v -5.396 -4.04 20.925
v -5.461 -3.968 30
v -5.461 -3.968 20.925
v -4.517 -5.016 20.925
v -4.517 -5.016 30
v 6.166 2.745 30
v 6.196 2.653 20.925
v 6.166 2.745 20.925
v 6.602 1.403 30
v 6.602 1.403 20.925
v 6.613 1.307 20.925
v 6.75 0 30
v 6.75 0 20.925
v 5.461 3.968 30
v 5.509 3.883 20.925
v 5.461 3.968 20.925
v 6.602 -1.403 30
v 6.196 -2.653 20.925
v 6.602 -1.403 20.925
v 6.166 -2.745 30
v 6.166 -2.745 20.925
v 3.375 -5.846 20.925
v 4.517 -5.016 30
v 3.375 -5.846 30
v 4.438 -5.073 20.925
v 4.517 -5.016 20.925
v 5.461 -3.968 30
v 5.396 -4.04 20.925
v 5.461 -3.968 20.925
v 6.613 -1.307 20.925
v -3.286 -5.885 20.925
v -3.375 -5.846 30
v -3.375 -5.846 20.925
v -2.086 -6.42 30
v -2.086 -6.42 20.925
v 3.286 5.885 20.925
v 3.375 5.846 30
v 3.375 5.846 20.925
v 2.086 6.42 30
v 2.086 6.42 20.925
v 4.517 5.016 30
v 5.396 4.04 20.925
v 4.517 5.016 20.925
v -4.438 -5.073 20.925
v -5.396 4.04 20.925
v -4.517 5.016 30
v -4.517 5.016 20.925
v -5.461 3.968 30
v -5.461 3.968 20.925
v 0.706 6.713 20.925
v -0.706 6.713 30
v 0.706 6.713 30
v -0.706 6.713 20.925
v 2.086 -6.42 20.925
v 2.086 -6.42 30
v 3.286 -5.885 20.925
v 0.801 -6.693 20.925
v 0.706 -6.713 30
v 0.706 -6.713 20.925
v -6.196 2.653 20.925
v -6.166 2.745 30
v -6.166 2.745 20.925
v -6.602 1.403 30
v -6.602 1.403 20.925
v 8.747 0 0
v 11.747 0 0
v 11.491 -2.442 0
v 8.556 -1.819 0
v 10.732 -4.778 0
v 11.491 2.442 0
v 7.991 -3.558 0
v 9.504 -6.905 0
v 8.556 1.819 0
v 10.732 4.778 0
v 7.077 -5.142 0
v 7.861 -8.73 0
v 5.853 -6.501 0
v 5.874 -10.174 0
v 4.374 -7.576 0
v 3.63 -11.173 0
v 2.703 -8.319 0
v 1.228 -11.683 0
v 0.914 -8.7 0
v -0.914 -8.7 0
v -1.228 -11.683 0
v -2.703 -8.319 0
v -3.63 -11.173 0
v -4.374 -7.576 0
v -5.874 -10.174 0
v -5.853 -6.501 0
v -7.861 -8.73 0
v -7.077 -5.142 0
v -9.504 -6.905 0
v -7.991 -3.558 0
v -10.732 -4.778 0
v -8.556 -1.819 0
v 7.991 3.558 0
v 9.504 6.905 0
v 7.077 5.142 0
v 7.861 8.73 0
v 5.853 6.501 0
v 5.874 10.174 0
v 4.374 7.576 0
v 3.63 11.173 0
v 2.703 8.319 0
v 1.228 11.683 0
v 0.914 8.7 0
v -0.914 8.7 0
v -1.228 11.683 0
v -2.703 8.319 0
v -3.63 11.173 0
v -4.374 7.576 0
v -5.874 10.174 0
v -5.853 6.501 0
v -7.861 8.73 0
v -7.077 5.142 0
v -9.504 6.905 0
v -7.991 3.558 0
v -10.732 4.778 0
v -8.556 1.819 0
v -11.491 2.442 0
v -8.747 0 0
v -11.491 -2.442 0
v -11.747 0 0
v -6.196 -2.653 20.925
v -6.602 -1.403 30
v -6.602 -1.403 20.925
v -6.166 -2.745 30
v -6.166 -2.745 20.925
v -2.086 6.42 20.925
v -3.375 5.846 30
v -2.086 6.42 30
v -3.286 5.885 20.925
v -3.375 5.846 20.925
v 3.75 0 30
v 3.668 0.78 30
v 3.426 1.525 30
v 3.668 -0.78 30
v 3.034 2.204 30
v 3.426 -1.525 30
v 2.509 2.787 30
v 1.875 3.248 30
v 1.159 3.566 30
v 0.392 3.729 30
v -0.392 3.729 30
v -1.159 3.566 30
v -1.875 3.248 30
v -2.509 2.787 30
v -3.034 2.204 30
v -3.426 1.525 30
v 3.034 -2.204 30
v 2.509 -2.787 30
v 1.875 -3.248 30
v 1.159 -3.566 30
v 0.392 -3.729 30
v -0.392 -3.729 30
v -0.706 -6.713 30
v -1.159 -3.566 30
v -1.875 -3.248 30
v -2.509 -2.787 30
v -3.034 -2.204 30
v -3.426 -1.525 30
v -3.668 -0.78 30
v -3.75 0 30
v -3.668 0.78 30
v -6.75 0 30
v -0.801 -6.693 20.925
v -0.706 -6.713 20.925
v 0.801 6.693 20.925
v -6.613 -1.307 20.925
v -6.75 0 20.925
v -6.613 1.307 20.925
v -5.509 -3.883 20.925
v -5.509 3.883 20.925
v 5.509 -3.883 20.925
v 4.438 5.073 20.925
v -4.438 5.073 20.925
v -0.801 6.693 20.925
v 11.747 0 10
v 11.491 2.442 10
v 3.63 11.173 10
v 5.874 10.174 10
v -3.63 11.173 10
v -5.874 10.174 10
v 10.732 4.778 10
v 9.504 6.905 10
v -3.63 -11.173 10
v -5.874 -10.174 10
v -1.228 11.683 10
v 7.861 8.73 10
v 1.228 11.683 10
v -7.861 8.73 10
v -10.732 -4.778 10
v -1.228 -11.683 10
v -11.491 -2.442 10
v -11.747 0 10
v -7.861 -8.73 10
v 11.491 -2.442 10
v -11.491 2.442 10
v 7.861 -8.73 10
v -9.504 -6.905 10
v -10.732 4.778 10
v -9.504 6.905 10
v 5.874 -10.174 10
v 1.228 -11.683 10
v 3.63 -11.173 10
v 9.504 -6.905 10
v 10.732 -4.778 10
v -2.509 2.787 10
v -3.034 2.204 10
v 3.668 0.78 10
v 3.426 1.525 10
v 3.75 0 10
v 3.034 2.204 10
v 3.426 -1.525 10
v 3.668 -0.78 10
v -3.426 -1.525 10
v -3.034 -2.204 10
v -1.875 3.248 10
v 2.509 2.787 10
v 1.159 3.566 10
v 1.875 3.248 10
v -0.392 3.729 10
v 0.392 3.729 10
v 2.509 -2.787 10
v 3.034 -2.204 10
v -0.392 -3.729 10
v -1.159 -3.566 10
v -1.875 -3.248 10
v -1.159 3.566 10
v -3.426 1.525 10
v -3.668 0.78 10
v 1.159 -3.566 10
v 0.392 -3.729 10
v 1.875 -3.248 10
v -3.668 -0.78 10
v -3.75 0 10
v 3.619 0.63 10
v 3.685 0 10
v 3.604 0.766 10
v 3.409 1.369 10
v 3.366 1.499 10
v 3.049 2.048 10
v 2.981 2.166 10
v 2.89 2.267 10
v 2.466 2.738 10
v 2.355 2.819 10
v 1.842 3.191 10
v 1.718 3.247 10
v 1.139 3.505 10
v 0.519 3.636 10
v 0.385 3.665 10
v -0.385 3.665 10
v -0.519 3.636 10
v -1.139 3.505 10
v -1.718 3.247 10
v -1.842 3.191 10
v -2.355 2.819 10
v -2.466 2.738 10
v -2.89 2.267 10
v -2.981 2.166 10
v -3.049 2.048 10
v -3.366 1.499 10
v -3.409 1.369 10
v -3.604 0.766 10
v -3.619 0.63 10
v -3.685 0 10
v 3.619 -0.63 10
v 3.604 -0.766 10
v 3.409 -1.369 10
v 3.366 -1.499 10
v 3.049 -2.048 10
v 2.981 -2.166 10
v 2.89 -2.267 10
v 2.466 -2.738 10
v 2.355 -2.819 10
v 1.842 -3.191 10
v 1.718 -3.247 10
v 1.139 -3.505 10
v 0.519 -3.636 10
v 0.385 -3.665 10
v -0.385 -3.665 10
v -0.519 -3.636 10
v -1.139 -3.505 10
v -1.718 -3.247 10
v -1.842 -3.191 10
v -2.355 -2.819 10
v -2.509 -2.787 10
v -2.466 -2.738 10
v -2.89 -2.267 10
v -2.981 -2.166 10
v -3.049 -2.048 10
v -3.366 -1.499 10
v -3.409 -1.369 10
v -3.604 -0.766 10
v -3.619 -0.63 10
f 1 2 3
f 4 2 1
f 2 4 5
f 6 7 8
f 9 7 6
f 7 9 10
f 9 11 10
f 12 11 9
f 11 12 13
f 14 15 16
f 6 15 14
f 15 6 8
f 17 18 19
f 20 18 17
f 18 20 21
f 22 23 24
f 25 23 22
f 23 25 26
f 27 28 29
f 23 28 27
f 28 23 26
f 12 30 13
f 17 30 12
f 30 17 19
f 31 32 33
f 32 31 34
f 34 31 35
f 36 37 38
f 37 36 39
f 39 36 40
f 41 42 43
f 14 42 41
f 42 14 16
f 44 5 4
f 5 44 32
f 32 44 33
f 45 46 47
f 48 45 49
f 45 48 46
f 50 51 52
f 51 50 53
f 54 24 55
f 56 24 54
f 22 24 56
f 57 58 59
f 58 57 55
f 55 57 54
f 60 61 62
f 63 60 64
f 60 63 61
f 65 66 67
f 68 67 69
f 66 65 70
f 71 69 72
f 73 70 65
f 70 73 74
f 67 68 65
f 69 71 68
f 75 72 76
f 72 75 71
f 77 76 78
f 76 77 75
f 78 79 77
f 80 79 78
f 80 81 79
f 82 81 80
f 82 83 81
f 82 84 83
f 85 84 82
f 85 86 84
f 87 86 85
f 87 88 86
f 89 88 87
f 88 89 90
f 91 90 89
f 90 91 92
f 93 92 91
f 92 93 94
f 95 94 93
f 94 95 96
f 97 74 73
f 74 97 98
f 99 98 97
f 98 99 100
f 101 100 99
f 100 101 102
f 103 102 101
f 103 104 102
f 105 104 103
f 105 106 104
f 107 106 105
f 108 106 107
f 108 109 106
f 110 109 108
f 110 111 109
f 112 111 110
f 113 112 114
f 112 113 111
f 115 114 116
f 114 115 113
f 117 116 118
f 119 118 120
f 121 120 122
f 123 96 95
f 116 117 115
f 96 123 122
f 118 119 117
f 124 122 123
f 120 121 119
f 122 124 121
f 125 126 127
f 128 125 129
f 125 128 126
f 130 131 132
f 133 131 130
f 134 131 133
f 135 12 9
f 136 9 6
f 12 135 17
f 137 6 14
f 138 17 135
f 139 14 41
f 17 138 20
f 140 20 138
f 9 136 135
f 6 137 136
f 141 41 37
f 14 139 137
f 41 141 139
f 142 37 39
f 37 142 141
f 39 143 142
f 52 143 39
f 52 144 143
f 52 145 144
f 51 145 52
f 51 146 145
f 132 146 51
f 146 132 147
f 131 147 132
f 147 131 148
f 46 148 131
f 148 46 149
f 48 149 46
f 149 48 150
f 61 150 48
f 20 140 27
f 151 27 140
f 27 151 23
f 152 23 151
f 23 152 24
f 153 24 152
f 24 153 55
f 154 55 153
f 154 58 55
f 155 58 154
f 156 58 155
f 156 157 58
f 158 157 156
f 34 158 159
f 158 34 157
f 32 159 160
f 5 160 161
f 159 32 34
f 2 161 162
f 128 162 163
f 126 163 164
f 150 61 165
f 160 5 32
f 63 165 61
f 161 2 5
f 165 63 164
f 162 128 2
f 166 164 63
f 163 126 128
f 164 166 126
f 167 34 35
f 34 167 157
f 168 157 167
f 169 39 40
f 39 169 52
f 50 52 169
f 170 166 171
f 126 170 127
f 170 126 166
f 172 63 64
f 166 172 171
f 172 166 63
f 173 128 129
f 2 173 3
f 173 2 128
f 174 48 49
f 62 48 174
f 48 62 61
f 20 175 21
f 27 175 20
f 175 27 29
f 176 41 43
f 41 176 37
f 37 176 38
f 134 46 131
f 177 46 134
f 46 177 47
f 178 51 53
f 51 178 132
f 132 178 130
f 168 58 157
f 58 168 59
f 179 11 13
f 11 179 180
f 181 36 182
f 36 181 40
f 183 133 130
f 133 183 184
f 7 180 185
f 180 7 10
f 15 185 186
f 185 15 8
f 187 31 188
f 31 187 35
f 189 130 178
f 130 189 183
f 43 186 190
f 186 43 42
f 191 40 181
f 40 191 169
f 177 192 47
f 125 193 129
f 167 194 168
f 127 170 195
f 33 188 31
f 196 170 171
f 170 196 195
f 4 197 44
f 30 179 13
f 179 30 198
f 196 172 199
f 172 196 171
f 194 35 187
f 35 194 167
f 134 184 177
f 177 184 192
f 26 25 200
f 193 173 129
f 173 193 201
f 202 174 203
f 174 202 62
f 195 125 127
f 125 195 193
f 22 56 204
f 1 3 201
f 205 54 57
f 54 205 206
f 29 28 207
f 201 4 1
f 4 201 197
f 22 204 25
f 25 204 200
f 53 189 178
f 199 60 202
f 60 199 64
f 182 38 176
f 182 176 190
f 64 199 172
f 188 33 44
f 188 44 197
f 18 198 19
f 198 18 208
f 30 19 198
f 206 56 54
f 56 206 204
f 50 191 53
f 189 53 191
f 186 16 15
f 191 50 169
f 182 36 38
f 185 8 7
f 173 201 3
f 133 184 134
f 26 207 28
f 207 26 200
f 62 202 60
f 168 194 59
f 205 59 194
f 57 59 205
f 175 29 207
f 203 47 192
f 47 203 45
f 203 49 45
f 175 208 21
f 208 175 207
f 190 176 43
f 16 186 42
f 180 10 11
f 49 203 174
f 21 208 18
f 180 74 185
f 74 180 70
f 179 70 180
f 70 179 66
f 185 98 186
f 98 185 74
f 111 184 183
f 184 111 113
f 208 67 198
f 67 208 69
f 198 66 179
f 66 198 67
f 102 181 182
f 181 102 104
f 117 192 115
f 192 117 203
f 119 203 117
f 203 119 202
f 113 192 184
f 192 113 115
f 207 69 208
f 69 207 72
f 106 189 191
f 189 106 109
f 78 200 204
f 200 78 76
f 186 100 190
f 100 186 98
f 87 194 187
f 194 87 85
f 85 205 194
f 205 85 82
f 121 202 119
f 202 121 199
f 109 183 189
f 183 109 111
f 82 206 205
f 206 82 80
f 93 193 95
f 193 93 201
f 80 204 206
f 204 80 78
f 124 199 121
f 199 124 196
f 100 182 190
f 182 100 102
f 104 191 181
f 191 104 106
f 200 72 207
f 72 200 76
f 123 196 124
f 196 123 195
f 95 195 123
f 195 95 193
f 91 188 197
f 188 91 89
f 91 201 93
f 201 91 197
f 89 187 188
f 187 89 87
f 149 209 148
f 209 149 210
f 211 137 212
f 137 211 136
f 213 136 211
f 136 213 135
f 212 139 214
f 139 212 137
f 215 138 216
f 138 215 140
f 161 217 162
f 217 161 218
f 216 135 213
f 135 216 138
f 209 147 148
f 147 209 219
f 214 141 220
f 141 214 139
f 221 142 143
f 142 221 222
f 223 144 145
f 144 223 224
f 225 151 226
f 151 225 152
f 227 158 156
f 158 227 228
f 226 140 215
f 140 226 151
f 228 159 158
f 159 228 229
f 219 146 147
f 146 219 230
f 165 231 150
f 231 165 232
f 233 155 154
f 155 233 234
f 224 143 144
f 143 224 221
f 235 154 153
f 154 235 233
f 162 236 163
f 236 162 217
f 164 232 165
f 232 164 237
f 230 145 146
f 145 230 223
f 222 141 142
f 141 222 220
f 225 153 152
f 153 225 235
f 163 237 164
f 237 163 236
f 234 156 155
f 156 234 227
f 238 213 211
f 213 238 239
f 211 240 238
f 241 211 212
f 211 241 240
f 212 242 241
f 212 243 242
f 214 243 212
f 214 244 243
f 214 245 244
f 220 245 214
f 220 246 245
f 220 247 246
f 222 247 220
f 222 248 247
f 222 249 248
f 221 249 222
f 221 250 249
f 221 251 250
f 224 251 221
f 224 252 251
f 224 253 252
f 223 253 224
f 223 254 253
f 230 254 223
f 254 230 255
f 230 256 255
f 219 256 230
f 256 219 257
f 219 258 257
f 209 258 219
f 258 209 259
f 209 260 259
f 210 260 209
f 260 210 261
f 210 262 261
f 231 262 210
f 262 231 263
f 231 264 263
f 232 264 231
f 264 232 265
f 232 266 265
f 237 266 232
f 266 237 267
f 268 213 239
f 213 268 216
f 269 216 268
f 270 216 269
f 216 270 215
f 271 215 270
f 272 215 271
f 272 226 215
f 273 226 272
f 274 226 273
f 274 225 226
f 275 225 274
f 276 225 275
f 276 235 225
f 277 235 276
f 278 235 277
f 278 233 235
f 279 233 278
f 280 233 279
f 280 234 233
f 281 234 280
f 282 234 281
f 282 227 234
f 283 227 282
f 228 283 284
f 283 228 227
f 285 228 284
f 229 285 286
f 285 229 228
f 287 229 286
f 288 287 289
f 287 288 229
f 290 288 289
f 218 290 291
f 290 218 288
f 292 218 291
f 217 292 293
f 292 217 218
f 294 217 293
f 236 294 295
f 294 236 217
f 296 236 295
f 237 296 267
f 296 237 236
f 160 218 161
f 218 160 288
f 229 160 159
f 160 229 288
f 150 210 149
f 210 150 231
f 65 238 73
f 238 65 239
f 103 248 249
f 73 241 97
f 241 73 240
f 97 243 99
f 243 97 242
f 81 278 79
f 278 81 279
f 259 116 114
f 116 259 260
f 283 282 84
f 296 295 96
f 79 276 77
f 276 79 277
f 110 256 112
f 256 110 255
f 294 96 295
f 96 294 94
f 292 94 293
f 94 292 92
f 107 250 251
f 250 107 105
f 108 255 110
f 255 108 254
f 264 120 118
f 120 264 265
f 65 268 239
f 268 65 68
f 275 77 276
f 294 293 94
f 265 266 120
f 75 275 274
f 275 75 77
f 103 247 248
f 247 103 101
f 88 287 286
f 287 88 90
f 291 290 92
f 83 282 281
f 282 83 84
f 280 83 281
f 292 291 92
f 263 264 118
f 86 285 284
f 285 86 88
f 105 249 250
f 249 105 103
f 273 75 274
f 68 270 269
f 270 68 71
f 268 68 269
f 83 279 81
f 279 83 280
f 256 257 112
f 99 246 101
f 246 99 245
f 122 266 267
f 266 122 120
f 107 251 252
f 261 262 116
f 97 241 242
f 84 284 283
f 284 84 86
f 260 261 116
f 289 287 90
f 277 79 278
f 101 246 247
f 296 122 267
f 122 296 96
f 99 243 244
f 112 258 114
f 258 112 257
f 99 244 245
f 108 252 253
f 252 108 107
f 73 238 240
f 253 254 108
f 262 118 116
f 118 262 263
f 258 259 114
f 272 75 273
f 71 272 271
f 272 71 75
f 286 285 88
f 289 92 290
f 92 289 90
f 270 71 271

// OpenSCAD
boreDiameter = 0.925*25.4;
baseHeight = 10;

coreDiameter = 7.5;
coreHeight   = 20;
wall = 3;

$fs=0.02;

render()
difference() {
  union() {

    // Core
    cylinder(r=(coreDiameter/2)+wall, h=coreHeight+baseHeight);

    // Base Taper
    translate([0,0,baseHeight])
    cylinder(r1=boreDiameter/2, h=boreDiameter);

    // Base
    cylinder(r=boreDiameter/2, h=baseHeight);
  }

  translate([0,0,baseHeight])
  cylinder(r=(coreDiameter/2), h=coreHeight+baseHeight);

  // Base Taper
  cylinder(r1=(boreDiameter/2)-wall, h=baseHeight+(coreDiameter*sqrt(2)/2));
}
